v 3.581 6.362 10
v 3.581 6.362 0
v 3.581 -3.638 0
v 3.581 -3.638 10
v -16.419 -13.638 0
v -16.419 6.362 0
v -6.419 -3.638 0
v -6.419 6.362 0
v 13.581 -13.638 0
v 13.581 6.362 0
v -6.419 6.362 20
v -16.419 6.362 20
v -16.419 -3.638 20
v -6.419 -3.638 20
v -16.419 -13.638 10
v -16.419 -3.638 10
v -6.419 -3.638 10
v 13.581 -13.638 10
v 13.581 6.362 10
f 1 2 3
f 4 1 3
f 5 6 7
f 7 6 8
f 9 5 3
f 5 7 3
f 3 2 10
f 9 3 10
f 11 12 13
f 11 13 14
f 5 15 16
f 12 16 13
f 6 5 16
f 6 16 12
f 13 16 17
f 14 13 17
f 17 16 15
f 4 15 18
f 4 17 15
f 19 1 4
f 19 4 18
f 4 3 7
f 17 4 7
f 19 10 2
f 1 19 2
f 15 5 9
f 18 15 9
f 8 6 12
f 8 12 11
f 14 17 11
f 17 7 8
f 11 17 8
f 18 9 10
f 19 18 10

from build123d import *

# Parameters (mm, degrees)
F1_DEPTH = 10
F2_W     = 10
F2_H     = 10
F3_DEPTH = 10


with BuildPart() as f1:
    # F0 (on Top) → F1 (new body)
    with BuildSketch(Plane.XY):
        Polygon((-16.419269, 6.361689), (-16.419269, 6.013863), (-16.419269, -13.638311), (13.580731, -13.638311), (13.580731, 6.361689), (3.580731, 6.361689), (3.580731, -3.638311), (-6.419269, -3.638311), (-6.419269, 6.361689), align=None)
    extrude(amount=F1_DEPTH)

    # F2 (on face) → F3 (join)
    with BuildSketch(Plane.XY.offset(10)):
        with Locations((-11.419269, 1.361689)):
            Rectangle(F2_W, F2_H)
    extrude(amount=F3_DEPTH)


solid = f1.part
